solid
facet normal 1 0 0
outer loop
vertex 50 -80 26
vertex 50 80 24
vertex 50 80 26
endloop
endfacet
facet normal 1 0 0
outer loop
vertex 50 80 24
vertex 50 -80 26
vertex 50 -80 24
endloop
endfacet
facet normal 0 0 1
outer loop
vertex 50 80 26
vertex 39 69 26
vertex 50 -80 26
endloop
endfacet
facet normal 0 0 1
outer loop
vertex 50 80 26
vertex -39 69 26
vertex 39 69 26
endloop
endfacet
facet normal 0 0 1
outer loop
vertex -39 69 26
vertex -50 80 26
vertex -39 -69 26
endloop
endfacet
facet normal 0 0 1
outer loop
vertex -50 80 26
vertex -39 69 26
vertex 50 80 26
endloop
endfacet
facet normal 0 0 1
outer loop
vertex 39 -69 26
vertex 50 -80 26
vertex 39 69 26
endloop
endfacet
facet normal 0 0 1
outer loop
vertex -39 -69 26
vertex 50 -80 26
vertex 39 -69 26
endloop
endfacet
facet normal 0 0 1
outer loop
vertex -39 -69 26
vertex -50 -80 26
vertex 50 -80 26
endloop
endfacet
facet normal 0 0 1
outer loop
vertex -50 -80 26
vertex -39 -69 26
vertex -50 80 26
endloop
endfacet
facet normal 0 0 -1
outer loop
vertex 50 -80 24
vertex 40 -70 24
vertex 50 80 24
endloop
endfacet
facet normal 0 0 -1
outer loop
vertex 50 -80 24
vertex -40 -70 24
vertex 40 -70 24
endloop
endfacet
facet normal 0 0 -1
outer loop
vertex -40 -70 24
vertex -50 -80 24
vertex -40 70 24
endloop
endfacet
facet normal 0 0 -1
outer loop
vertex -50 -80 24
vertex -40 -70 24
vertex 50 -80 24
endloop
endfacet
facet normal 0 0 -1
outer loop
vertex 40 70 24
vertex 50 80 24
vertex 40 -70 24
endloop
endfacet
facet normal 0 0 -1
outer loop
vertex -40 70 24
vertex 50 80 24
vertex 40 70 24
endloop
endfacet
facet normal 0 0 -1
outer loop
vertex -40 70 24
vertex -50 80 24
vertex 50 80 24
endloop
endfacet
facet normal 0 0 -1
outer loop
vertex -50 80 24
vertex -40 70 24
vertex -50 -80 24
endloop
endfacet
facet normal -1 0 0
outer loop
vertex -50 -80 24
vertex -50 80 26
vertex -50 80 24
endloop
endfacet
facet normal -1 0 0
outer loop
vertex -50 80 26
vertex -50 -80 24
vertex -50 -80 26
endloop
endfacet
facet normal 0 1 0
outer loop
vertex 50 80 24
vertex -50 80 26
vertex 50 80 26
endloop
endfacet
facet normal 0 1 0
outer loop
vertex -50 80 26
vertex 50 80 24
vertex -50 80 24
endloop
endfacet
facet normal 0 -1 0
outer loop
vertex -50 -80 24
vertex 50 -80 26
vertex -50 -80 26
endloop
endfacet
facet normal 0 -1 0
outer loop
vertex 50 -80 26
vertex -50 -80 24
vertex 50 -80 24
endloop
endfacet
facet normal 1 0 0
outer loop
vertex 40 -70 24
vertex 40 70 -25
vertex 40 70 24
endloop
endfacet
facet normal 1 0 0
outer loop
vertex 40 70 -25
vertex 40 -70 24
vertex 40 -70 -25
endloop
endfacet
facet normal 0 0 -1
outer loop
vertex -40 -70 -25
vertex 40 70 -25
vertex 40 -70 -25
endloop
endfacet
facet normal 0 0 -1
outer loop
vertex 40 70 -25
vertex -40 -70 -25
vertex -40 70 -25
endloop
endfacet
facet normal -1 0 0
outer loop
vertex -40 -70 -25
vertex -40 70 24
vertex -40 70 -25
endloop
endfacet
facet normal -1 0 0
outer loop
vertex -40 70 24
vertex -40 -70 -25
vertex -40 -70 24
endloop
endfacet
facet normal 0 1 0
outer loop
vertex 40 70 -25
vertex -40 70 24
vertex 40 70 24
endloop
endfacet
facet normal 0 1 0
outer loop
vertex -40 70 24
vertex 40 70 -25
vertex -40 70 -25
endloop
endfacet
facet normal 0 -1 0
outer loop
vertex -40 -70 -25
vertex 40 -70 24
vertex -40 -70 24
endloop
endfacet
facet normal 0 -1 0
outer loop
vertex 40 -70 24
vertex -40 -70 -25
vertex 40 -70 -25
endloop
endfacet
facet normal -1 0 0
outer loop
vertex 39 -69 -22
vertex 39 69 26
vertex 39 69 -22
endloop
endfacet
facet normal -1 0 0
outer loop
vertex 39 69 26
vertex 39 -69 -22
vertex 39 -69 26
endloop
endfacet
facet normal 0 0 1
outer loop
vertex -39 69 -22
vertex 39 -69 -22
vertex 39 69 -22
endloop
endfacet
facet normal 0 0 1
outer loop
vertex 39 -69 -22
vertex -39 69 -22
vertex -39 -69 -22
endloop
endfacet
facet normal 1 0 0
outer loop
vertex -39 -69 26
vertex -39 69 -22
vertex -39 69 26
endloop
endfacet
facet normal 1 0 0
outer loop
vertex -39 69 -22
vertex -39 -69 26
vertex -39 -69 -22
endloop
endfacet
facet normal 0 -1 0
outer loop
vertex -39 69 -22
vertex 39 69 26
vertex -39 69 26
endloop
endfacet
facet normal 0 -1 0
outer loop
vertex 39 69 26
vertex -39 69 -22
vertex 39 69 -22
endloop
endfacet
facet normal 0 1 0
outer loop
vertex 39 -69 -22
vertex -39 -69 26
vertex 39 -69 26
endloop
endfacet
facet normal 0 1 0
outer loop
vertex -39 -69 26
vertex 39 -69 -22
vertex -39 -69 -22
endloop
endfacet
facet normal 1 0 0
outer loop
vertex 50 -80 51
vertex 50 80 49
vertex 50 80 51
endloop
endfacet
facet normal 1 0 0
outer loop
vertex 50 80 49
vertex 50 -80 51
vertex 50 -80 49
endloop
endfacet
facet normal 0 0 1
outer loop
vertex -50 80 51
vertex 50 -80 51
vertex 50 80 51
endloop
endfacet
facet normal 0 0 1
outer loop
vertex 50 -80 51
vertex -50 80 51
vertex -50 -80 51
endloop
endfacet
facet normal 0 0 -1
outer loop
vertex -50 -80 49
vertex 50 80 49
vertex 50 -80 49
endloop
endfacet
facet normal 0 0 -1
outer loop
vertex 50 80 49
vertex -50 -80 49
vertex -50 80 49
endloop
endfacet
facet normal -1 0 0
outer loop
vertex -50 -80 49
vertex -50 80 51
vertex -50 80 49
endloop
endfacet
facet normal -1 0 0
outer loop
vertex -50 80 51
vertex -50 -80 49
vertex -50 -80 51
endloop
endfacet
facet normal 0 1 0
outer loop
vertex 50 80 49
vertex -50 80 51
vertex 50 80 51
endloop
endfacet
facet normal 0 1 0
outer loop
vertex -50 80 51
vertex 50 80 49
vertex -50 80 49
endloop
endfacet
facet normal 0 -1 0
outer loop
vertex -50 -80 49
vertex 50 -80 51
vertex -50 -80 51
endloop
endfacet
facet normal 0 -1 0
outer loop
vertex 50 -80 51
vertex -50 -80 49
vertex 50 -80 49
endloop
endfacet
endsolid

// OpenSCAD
/** Power Supply Case **/

module case_power(l=100,w=160,h=50,thickness=2,border=10) {

    color("white") difference() {
        group() {
            translate([0,0,h/2]) cube([l,w,thickness], center=true);
            cube([l-2*border,w-2*border,h], center=true);
        }
        translate([0,0,thickness]) cube([l-2*border-thickness,w-2*border-thickness,h-thickness], center=true);
    }


    translate([0,0,h]) cube([l,w,thickness], center=true);
}

case_power(); 
